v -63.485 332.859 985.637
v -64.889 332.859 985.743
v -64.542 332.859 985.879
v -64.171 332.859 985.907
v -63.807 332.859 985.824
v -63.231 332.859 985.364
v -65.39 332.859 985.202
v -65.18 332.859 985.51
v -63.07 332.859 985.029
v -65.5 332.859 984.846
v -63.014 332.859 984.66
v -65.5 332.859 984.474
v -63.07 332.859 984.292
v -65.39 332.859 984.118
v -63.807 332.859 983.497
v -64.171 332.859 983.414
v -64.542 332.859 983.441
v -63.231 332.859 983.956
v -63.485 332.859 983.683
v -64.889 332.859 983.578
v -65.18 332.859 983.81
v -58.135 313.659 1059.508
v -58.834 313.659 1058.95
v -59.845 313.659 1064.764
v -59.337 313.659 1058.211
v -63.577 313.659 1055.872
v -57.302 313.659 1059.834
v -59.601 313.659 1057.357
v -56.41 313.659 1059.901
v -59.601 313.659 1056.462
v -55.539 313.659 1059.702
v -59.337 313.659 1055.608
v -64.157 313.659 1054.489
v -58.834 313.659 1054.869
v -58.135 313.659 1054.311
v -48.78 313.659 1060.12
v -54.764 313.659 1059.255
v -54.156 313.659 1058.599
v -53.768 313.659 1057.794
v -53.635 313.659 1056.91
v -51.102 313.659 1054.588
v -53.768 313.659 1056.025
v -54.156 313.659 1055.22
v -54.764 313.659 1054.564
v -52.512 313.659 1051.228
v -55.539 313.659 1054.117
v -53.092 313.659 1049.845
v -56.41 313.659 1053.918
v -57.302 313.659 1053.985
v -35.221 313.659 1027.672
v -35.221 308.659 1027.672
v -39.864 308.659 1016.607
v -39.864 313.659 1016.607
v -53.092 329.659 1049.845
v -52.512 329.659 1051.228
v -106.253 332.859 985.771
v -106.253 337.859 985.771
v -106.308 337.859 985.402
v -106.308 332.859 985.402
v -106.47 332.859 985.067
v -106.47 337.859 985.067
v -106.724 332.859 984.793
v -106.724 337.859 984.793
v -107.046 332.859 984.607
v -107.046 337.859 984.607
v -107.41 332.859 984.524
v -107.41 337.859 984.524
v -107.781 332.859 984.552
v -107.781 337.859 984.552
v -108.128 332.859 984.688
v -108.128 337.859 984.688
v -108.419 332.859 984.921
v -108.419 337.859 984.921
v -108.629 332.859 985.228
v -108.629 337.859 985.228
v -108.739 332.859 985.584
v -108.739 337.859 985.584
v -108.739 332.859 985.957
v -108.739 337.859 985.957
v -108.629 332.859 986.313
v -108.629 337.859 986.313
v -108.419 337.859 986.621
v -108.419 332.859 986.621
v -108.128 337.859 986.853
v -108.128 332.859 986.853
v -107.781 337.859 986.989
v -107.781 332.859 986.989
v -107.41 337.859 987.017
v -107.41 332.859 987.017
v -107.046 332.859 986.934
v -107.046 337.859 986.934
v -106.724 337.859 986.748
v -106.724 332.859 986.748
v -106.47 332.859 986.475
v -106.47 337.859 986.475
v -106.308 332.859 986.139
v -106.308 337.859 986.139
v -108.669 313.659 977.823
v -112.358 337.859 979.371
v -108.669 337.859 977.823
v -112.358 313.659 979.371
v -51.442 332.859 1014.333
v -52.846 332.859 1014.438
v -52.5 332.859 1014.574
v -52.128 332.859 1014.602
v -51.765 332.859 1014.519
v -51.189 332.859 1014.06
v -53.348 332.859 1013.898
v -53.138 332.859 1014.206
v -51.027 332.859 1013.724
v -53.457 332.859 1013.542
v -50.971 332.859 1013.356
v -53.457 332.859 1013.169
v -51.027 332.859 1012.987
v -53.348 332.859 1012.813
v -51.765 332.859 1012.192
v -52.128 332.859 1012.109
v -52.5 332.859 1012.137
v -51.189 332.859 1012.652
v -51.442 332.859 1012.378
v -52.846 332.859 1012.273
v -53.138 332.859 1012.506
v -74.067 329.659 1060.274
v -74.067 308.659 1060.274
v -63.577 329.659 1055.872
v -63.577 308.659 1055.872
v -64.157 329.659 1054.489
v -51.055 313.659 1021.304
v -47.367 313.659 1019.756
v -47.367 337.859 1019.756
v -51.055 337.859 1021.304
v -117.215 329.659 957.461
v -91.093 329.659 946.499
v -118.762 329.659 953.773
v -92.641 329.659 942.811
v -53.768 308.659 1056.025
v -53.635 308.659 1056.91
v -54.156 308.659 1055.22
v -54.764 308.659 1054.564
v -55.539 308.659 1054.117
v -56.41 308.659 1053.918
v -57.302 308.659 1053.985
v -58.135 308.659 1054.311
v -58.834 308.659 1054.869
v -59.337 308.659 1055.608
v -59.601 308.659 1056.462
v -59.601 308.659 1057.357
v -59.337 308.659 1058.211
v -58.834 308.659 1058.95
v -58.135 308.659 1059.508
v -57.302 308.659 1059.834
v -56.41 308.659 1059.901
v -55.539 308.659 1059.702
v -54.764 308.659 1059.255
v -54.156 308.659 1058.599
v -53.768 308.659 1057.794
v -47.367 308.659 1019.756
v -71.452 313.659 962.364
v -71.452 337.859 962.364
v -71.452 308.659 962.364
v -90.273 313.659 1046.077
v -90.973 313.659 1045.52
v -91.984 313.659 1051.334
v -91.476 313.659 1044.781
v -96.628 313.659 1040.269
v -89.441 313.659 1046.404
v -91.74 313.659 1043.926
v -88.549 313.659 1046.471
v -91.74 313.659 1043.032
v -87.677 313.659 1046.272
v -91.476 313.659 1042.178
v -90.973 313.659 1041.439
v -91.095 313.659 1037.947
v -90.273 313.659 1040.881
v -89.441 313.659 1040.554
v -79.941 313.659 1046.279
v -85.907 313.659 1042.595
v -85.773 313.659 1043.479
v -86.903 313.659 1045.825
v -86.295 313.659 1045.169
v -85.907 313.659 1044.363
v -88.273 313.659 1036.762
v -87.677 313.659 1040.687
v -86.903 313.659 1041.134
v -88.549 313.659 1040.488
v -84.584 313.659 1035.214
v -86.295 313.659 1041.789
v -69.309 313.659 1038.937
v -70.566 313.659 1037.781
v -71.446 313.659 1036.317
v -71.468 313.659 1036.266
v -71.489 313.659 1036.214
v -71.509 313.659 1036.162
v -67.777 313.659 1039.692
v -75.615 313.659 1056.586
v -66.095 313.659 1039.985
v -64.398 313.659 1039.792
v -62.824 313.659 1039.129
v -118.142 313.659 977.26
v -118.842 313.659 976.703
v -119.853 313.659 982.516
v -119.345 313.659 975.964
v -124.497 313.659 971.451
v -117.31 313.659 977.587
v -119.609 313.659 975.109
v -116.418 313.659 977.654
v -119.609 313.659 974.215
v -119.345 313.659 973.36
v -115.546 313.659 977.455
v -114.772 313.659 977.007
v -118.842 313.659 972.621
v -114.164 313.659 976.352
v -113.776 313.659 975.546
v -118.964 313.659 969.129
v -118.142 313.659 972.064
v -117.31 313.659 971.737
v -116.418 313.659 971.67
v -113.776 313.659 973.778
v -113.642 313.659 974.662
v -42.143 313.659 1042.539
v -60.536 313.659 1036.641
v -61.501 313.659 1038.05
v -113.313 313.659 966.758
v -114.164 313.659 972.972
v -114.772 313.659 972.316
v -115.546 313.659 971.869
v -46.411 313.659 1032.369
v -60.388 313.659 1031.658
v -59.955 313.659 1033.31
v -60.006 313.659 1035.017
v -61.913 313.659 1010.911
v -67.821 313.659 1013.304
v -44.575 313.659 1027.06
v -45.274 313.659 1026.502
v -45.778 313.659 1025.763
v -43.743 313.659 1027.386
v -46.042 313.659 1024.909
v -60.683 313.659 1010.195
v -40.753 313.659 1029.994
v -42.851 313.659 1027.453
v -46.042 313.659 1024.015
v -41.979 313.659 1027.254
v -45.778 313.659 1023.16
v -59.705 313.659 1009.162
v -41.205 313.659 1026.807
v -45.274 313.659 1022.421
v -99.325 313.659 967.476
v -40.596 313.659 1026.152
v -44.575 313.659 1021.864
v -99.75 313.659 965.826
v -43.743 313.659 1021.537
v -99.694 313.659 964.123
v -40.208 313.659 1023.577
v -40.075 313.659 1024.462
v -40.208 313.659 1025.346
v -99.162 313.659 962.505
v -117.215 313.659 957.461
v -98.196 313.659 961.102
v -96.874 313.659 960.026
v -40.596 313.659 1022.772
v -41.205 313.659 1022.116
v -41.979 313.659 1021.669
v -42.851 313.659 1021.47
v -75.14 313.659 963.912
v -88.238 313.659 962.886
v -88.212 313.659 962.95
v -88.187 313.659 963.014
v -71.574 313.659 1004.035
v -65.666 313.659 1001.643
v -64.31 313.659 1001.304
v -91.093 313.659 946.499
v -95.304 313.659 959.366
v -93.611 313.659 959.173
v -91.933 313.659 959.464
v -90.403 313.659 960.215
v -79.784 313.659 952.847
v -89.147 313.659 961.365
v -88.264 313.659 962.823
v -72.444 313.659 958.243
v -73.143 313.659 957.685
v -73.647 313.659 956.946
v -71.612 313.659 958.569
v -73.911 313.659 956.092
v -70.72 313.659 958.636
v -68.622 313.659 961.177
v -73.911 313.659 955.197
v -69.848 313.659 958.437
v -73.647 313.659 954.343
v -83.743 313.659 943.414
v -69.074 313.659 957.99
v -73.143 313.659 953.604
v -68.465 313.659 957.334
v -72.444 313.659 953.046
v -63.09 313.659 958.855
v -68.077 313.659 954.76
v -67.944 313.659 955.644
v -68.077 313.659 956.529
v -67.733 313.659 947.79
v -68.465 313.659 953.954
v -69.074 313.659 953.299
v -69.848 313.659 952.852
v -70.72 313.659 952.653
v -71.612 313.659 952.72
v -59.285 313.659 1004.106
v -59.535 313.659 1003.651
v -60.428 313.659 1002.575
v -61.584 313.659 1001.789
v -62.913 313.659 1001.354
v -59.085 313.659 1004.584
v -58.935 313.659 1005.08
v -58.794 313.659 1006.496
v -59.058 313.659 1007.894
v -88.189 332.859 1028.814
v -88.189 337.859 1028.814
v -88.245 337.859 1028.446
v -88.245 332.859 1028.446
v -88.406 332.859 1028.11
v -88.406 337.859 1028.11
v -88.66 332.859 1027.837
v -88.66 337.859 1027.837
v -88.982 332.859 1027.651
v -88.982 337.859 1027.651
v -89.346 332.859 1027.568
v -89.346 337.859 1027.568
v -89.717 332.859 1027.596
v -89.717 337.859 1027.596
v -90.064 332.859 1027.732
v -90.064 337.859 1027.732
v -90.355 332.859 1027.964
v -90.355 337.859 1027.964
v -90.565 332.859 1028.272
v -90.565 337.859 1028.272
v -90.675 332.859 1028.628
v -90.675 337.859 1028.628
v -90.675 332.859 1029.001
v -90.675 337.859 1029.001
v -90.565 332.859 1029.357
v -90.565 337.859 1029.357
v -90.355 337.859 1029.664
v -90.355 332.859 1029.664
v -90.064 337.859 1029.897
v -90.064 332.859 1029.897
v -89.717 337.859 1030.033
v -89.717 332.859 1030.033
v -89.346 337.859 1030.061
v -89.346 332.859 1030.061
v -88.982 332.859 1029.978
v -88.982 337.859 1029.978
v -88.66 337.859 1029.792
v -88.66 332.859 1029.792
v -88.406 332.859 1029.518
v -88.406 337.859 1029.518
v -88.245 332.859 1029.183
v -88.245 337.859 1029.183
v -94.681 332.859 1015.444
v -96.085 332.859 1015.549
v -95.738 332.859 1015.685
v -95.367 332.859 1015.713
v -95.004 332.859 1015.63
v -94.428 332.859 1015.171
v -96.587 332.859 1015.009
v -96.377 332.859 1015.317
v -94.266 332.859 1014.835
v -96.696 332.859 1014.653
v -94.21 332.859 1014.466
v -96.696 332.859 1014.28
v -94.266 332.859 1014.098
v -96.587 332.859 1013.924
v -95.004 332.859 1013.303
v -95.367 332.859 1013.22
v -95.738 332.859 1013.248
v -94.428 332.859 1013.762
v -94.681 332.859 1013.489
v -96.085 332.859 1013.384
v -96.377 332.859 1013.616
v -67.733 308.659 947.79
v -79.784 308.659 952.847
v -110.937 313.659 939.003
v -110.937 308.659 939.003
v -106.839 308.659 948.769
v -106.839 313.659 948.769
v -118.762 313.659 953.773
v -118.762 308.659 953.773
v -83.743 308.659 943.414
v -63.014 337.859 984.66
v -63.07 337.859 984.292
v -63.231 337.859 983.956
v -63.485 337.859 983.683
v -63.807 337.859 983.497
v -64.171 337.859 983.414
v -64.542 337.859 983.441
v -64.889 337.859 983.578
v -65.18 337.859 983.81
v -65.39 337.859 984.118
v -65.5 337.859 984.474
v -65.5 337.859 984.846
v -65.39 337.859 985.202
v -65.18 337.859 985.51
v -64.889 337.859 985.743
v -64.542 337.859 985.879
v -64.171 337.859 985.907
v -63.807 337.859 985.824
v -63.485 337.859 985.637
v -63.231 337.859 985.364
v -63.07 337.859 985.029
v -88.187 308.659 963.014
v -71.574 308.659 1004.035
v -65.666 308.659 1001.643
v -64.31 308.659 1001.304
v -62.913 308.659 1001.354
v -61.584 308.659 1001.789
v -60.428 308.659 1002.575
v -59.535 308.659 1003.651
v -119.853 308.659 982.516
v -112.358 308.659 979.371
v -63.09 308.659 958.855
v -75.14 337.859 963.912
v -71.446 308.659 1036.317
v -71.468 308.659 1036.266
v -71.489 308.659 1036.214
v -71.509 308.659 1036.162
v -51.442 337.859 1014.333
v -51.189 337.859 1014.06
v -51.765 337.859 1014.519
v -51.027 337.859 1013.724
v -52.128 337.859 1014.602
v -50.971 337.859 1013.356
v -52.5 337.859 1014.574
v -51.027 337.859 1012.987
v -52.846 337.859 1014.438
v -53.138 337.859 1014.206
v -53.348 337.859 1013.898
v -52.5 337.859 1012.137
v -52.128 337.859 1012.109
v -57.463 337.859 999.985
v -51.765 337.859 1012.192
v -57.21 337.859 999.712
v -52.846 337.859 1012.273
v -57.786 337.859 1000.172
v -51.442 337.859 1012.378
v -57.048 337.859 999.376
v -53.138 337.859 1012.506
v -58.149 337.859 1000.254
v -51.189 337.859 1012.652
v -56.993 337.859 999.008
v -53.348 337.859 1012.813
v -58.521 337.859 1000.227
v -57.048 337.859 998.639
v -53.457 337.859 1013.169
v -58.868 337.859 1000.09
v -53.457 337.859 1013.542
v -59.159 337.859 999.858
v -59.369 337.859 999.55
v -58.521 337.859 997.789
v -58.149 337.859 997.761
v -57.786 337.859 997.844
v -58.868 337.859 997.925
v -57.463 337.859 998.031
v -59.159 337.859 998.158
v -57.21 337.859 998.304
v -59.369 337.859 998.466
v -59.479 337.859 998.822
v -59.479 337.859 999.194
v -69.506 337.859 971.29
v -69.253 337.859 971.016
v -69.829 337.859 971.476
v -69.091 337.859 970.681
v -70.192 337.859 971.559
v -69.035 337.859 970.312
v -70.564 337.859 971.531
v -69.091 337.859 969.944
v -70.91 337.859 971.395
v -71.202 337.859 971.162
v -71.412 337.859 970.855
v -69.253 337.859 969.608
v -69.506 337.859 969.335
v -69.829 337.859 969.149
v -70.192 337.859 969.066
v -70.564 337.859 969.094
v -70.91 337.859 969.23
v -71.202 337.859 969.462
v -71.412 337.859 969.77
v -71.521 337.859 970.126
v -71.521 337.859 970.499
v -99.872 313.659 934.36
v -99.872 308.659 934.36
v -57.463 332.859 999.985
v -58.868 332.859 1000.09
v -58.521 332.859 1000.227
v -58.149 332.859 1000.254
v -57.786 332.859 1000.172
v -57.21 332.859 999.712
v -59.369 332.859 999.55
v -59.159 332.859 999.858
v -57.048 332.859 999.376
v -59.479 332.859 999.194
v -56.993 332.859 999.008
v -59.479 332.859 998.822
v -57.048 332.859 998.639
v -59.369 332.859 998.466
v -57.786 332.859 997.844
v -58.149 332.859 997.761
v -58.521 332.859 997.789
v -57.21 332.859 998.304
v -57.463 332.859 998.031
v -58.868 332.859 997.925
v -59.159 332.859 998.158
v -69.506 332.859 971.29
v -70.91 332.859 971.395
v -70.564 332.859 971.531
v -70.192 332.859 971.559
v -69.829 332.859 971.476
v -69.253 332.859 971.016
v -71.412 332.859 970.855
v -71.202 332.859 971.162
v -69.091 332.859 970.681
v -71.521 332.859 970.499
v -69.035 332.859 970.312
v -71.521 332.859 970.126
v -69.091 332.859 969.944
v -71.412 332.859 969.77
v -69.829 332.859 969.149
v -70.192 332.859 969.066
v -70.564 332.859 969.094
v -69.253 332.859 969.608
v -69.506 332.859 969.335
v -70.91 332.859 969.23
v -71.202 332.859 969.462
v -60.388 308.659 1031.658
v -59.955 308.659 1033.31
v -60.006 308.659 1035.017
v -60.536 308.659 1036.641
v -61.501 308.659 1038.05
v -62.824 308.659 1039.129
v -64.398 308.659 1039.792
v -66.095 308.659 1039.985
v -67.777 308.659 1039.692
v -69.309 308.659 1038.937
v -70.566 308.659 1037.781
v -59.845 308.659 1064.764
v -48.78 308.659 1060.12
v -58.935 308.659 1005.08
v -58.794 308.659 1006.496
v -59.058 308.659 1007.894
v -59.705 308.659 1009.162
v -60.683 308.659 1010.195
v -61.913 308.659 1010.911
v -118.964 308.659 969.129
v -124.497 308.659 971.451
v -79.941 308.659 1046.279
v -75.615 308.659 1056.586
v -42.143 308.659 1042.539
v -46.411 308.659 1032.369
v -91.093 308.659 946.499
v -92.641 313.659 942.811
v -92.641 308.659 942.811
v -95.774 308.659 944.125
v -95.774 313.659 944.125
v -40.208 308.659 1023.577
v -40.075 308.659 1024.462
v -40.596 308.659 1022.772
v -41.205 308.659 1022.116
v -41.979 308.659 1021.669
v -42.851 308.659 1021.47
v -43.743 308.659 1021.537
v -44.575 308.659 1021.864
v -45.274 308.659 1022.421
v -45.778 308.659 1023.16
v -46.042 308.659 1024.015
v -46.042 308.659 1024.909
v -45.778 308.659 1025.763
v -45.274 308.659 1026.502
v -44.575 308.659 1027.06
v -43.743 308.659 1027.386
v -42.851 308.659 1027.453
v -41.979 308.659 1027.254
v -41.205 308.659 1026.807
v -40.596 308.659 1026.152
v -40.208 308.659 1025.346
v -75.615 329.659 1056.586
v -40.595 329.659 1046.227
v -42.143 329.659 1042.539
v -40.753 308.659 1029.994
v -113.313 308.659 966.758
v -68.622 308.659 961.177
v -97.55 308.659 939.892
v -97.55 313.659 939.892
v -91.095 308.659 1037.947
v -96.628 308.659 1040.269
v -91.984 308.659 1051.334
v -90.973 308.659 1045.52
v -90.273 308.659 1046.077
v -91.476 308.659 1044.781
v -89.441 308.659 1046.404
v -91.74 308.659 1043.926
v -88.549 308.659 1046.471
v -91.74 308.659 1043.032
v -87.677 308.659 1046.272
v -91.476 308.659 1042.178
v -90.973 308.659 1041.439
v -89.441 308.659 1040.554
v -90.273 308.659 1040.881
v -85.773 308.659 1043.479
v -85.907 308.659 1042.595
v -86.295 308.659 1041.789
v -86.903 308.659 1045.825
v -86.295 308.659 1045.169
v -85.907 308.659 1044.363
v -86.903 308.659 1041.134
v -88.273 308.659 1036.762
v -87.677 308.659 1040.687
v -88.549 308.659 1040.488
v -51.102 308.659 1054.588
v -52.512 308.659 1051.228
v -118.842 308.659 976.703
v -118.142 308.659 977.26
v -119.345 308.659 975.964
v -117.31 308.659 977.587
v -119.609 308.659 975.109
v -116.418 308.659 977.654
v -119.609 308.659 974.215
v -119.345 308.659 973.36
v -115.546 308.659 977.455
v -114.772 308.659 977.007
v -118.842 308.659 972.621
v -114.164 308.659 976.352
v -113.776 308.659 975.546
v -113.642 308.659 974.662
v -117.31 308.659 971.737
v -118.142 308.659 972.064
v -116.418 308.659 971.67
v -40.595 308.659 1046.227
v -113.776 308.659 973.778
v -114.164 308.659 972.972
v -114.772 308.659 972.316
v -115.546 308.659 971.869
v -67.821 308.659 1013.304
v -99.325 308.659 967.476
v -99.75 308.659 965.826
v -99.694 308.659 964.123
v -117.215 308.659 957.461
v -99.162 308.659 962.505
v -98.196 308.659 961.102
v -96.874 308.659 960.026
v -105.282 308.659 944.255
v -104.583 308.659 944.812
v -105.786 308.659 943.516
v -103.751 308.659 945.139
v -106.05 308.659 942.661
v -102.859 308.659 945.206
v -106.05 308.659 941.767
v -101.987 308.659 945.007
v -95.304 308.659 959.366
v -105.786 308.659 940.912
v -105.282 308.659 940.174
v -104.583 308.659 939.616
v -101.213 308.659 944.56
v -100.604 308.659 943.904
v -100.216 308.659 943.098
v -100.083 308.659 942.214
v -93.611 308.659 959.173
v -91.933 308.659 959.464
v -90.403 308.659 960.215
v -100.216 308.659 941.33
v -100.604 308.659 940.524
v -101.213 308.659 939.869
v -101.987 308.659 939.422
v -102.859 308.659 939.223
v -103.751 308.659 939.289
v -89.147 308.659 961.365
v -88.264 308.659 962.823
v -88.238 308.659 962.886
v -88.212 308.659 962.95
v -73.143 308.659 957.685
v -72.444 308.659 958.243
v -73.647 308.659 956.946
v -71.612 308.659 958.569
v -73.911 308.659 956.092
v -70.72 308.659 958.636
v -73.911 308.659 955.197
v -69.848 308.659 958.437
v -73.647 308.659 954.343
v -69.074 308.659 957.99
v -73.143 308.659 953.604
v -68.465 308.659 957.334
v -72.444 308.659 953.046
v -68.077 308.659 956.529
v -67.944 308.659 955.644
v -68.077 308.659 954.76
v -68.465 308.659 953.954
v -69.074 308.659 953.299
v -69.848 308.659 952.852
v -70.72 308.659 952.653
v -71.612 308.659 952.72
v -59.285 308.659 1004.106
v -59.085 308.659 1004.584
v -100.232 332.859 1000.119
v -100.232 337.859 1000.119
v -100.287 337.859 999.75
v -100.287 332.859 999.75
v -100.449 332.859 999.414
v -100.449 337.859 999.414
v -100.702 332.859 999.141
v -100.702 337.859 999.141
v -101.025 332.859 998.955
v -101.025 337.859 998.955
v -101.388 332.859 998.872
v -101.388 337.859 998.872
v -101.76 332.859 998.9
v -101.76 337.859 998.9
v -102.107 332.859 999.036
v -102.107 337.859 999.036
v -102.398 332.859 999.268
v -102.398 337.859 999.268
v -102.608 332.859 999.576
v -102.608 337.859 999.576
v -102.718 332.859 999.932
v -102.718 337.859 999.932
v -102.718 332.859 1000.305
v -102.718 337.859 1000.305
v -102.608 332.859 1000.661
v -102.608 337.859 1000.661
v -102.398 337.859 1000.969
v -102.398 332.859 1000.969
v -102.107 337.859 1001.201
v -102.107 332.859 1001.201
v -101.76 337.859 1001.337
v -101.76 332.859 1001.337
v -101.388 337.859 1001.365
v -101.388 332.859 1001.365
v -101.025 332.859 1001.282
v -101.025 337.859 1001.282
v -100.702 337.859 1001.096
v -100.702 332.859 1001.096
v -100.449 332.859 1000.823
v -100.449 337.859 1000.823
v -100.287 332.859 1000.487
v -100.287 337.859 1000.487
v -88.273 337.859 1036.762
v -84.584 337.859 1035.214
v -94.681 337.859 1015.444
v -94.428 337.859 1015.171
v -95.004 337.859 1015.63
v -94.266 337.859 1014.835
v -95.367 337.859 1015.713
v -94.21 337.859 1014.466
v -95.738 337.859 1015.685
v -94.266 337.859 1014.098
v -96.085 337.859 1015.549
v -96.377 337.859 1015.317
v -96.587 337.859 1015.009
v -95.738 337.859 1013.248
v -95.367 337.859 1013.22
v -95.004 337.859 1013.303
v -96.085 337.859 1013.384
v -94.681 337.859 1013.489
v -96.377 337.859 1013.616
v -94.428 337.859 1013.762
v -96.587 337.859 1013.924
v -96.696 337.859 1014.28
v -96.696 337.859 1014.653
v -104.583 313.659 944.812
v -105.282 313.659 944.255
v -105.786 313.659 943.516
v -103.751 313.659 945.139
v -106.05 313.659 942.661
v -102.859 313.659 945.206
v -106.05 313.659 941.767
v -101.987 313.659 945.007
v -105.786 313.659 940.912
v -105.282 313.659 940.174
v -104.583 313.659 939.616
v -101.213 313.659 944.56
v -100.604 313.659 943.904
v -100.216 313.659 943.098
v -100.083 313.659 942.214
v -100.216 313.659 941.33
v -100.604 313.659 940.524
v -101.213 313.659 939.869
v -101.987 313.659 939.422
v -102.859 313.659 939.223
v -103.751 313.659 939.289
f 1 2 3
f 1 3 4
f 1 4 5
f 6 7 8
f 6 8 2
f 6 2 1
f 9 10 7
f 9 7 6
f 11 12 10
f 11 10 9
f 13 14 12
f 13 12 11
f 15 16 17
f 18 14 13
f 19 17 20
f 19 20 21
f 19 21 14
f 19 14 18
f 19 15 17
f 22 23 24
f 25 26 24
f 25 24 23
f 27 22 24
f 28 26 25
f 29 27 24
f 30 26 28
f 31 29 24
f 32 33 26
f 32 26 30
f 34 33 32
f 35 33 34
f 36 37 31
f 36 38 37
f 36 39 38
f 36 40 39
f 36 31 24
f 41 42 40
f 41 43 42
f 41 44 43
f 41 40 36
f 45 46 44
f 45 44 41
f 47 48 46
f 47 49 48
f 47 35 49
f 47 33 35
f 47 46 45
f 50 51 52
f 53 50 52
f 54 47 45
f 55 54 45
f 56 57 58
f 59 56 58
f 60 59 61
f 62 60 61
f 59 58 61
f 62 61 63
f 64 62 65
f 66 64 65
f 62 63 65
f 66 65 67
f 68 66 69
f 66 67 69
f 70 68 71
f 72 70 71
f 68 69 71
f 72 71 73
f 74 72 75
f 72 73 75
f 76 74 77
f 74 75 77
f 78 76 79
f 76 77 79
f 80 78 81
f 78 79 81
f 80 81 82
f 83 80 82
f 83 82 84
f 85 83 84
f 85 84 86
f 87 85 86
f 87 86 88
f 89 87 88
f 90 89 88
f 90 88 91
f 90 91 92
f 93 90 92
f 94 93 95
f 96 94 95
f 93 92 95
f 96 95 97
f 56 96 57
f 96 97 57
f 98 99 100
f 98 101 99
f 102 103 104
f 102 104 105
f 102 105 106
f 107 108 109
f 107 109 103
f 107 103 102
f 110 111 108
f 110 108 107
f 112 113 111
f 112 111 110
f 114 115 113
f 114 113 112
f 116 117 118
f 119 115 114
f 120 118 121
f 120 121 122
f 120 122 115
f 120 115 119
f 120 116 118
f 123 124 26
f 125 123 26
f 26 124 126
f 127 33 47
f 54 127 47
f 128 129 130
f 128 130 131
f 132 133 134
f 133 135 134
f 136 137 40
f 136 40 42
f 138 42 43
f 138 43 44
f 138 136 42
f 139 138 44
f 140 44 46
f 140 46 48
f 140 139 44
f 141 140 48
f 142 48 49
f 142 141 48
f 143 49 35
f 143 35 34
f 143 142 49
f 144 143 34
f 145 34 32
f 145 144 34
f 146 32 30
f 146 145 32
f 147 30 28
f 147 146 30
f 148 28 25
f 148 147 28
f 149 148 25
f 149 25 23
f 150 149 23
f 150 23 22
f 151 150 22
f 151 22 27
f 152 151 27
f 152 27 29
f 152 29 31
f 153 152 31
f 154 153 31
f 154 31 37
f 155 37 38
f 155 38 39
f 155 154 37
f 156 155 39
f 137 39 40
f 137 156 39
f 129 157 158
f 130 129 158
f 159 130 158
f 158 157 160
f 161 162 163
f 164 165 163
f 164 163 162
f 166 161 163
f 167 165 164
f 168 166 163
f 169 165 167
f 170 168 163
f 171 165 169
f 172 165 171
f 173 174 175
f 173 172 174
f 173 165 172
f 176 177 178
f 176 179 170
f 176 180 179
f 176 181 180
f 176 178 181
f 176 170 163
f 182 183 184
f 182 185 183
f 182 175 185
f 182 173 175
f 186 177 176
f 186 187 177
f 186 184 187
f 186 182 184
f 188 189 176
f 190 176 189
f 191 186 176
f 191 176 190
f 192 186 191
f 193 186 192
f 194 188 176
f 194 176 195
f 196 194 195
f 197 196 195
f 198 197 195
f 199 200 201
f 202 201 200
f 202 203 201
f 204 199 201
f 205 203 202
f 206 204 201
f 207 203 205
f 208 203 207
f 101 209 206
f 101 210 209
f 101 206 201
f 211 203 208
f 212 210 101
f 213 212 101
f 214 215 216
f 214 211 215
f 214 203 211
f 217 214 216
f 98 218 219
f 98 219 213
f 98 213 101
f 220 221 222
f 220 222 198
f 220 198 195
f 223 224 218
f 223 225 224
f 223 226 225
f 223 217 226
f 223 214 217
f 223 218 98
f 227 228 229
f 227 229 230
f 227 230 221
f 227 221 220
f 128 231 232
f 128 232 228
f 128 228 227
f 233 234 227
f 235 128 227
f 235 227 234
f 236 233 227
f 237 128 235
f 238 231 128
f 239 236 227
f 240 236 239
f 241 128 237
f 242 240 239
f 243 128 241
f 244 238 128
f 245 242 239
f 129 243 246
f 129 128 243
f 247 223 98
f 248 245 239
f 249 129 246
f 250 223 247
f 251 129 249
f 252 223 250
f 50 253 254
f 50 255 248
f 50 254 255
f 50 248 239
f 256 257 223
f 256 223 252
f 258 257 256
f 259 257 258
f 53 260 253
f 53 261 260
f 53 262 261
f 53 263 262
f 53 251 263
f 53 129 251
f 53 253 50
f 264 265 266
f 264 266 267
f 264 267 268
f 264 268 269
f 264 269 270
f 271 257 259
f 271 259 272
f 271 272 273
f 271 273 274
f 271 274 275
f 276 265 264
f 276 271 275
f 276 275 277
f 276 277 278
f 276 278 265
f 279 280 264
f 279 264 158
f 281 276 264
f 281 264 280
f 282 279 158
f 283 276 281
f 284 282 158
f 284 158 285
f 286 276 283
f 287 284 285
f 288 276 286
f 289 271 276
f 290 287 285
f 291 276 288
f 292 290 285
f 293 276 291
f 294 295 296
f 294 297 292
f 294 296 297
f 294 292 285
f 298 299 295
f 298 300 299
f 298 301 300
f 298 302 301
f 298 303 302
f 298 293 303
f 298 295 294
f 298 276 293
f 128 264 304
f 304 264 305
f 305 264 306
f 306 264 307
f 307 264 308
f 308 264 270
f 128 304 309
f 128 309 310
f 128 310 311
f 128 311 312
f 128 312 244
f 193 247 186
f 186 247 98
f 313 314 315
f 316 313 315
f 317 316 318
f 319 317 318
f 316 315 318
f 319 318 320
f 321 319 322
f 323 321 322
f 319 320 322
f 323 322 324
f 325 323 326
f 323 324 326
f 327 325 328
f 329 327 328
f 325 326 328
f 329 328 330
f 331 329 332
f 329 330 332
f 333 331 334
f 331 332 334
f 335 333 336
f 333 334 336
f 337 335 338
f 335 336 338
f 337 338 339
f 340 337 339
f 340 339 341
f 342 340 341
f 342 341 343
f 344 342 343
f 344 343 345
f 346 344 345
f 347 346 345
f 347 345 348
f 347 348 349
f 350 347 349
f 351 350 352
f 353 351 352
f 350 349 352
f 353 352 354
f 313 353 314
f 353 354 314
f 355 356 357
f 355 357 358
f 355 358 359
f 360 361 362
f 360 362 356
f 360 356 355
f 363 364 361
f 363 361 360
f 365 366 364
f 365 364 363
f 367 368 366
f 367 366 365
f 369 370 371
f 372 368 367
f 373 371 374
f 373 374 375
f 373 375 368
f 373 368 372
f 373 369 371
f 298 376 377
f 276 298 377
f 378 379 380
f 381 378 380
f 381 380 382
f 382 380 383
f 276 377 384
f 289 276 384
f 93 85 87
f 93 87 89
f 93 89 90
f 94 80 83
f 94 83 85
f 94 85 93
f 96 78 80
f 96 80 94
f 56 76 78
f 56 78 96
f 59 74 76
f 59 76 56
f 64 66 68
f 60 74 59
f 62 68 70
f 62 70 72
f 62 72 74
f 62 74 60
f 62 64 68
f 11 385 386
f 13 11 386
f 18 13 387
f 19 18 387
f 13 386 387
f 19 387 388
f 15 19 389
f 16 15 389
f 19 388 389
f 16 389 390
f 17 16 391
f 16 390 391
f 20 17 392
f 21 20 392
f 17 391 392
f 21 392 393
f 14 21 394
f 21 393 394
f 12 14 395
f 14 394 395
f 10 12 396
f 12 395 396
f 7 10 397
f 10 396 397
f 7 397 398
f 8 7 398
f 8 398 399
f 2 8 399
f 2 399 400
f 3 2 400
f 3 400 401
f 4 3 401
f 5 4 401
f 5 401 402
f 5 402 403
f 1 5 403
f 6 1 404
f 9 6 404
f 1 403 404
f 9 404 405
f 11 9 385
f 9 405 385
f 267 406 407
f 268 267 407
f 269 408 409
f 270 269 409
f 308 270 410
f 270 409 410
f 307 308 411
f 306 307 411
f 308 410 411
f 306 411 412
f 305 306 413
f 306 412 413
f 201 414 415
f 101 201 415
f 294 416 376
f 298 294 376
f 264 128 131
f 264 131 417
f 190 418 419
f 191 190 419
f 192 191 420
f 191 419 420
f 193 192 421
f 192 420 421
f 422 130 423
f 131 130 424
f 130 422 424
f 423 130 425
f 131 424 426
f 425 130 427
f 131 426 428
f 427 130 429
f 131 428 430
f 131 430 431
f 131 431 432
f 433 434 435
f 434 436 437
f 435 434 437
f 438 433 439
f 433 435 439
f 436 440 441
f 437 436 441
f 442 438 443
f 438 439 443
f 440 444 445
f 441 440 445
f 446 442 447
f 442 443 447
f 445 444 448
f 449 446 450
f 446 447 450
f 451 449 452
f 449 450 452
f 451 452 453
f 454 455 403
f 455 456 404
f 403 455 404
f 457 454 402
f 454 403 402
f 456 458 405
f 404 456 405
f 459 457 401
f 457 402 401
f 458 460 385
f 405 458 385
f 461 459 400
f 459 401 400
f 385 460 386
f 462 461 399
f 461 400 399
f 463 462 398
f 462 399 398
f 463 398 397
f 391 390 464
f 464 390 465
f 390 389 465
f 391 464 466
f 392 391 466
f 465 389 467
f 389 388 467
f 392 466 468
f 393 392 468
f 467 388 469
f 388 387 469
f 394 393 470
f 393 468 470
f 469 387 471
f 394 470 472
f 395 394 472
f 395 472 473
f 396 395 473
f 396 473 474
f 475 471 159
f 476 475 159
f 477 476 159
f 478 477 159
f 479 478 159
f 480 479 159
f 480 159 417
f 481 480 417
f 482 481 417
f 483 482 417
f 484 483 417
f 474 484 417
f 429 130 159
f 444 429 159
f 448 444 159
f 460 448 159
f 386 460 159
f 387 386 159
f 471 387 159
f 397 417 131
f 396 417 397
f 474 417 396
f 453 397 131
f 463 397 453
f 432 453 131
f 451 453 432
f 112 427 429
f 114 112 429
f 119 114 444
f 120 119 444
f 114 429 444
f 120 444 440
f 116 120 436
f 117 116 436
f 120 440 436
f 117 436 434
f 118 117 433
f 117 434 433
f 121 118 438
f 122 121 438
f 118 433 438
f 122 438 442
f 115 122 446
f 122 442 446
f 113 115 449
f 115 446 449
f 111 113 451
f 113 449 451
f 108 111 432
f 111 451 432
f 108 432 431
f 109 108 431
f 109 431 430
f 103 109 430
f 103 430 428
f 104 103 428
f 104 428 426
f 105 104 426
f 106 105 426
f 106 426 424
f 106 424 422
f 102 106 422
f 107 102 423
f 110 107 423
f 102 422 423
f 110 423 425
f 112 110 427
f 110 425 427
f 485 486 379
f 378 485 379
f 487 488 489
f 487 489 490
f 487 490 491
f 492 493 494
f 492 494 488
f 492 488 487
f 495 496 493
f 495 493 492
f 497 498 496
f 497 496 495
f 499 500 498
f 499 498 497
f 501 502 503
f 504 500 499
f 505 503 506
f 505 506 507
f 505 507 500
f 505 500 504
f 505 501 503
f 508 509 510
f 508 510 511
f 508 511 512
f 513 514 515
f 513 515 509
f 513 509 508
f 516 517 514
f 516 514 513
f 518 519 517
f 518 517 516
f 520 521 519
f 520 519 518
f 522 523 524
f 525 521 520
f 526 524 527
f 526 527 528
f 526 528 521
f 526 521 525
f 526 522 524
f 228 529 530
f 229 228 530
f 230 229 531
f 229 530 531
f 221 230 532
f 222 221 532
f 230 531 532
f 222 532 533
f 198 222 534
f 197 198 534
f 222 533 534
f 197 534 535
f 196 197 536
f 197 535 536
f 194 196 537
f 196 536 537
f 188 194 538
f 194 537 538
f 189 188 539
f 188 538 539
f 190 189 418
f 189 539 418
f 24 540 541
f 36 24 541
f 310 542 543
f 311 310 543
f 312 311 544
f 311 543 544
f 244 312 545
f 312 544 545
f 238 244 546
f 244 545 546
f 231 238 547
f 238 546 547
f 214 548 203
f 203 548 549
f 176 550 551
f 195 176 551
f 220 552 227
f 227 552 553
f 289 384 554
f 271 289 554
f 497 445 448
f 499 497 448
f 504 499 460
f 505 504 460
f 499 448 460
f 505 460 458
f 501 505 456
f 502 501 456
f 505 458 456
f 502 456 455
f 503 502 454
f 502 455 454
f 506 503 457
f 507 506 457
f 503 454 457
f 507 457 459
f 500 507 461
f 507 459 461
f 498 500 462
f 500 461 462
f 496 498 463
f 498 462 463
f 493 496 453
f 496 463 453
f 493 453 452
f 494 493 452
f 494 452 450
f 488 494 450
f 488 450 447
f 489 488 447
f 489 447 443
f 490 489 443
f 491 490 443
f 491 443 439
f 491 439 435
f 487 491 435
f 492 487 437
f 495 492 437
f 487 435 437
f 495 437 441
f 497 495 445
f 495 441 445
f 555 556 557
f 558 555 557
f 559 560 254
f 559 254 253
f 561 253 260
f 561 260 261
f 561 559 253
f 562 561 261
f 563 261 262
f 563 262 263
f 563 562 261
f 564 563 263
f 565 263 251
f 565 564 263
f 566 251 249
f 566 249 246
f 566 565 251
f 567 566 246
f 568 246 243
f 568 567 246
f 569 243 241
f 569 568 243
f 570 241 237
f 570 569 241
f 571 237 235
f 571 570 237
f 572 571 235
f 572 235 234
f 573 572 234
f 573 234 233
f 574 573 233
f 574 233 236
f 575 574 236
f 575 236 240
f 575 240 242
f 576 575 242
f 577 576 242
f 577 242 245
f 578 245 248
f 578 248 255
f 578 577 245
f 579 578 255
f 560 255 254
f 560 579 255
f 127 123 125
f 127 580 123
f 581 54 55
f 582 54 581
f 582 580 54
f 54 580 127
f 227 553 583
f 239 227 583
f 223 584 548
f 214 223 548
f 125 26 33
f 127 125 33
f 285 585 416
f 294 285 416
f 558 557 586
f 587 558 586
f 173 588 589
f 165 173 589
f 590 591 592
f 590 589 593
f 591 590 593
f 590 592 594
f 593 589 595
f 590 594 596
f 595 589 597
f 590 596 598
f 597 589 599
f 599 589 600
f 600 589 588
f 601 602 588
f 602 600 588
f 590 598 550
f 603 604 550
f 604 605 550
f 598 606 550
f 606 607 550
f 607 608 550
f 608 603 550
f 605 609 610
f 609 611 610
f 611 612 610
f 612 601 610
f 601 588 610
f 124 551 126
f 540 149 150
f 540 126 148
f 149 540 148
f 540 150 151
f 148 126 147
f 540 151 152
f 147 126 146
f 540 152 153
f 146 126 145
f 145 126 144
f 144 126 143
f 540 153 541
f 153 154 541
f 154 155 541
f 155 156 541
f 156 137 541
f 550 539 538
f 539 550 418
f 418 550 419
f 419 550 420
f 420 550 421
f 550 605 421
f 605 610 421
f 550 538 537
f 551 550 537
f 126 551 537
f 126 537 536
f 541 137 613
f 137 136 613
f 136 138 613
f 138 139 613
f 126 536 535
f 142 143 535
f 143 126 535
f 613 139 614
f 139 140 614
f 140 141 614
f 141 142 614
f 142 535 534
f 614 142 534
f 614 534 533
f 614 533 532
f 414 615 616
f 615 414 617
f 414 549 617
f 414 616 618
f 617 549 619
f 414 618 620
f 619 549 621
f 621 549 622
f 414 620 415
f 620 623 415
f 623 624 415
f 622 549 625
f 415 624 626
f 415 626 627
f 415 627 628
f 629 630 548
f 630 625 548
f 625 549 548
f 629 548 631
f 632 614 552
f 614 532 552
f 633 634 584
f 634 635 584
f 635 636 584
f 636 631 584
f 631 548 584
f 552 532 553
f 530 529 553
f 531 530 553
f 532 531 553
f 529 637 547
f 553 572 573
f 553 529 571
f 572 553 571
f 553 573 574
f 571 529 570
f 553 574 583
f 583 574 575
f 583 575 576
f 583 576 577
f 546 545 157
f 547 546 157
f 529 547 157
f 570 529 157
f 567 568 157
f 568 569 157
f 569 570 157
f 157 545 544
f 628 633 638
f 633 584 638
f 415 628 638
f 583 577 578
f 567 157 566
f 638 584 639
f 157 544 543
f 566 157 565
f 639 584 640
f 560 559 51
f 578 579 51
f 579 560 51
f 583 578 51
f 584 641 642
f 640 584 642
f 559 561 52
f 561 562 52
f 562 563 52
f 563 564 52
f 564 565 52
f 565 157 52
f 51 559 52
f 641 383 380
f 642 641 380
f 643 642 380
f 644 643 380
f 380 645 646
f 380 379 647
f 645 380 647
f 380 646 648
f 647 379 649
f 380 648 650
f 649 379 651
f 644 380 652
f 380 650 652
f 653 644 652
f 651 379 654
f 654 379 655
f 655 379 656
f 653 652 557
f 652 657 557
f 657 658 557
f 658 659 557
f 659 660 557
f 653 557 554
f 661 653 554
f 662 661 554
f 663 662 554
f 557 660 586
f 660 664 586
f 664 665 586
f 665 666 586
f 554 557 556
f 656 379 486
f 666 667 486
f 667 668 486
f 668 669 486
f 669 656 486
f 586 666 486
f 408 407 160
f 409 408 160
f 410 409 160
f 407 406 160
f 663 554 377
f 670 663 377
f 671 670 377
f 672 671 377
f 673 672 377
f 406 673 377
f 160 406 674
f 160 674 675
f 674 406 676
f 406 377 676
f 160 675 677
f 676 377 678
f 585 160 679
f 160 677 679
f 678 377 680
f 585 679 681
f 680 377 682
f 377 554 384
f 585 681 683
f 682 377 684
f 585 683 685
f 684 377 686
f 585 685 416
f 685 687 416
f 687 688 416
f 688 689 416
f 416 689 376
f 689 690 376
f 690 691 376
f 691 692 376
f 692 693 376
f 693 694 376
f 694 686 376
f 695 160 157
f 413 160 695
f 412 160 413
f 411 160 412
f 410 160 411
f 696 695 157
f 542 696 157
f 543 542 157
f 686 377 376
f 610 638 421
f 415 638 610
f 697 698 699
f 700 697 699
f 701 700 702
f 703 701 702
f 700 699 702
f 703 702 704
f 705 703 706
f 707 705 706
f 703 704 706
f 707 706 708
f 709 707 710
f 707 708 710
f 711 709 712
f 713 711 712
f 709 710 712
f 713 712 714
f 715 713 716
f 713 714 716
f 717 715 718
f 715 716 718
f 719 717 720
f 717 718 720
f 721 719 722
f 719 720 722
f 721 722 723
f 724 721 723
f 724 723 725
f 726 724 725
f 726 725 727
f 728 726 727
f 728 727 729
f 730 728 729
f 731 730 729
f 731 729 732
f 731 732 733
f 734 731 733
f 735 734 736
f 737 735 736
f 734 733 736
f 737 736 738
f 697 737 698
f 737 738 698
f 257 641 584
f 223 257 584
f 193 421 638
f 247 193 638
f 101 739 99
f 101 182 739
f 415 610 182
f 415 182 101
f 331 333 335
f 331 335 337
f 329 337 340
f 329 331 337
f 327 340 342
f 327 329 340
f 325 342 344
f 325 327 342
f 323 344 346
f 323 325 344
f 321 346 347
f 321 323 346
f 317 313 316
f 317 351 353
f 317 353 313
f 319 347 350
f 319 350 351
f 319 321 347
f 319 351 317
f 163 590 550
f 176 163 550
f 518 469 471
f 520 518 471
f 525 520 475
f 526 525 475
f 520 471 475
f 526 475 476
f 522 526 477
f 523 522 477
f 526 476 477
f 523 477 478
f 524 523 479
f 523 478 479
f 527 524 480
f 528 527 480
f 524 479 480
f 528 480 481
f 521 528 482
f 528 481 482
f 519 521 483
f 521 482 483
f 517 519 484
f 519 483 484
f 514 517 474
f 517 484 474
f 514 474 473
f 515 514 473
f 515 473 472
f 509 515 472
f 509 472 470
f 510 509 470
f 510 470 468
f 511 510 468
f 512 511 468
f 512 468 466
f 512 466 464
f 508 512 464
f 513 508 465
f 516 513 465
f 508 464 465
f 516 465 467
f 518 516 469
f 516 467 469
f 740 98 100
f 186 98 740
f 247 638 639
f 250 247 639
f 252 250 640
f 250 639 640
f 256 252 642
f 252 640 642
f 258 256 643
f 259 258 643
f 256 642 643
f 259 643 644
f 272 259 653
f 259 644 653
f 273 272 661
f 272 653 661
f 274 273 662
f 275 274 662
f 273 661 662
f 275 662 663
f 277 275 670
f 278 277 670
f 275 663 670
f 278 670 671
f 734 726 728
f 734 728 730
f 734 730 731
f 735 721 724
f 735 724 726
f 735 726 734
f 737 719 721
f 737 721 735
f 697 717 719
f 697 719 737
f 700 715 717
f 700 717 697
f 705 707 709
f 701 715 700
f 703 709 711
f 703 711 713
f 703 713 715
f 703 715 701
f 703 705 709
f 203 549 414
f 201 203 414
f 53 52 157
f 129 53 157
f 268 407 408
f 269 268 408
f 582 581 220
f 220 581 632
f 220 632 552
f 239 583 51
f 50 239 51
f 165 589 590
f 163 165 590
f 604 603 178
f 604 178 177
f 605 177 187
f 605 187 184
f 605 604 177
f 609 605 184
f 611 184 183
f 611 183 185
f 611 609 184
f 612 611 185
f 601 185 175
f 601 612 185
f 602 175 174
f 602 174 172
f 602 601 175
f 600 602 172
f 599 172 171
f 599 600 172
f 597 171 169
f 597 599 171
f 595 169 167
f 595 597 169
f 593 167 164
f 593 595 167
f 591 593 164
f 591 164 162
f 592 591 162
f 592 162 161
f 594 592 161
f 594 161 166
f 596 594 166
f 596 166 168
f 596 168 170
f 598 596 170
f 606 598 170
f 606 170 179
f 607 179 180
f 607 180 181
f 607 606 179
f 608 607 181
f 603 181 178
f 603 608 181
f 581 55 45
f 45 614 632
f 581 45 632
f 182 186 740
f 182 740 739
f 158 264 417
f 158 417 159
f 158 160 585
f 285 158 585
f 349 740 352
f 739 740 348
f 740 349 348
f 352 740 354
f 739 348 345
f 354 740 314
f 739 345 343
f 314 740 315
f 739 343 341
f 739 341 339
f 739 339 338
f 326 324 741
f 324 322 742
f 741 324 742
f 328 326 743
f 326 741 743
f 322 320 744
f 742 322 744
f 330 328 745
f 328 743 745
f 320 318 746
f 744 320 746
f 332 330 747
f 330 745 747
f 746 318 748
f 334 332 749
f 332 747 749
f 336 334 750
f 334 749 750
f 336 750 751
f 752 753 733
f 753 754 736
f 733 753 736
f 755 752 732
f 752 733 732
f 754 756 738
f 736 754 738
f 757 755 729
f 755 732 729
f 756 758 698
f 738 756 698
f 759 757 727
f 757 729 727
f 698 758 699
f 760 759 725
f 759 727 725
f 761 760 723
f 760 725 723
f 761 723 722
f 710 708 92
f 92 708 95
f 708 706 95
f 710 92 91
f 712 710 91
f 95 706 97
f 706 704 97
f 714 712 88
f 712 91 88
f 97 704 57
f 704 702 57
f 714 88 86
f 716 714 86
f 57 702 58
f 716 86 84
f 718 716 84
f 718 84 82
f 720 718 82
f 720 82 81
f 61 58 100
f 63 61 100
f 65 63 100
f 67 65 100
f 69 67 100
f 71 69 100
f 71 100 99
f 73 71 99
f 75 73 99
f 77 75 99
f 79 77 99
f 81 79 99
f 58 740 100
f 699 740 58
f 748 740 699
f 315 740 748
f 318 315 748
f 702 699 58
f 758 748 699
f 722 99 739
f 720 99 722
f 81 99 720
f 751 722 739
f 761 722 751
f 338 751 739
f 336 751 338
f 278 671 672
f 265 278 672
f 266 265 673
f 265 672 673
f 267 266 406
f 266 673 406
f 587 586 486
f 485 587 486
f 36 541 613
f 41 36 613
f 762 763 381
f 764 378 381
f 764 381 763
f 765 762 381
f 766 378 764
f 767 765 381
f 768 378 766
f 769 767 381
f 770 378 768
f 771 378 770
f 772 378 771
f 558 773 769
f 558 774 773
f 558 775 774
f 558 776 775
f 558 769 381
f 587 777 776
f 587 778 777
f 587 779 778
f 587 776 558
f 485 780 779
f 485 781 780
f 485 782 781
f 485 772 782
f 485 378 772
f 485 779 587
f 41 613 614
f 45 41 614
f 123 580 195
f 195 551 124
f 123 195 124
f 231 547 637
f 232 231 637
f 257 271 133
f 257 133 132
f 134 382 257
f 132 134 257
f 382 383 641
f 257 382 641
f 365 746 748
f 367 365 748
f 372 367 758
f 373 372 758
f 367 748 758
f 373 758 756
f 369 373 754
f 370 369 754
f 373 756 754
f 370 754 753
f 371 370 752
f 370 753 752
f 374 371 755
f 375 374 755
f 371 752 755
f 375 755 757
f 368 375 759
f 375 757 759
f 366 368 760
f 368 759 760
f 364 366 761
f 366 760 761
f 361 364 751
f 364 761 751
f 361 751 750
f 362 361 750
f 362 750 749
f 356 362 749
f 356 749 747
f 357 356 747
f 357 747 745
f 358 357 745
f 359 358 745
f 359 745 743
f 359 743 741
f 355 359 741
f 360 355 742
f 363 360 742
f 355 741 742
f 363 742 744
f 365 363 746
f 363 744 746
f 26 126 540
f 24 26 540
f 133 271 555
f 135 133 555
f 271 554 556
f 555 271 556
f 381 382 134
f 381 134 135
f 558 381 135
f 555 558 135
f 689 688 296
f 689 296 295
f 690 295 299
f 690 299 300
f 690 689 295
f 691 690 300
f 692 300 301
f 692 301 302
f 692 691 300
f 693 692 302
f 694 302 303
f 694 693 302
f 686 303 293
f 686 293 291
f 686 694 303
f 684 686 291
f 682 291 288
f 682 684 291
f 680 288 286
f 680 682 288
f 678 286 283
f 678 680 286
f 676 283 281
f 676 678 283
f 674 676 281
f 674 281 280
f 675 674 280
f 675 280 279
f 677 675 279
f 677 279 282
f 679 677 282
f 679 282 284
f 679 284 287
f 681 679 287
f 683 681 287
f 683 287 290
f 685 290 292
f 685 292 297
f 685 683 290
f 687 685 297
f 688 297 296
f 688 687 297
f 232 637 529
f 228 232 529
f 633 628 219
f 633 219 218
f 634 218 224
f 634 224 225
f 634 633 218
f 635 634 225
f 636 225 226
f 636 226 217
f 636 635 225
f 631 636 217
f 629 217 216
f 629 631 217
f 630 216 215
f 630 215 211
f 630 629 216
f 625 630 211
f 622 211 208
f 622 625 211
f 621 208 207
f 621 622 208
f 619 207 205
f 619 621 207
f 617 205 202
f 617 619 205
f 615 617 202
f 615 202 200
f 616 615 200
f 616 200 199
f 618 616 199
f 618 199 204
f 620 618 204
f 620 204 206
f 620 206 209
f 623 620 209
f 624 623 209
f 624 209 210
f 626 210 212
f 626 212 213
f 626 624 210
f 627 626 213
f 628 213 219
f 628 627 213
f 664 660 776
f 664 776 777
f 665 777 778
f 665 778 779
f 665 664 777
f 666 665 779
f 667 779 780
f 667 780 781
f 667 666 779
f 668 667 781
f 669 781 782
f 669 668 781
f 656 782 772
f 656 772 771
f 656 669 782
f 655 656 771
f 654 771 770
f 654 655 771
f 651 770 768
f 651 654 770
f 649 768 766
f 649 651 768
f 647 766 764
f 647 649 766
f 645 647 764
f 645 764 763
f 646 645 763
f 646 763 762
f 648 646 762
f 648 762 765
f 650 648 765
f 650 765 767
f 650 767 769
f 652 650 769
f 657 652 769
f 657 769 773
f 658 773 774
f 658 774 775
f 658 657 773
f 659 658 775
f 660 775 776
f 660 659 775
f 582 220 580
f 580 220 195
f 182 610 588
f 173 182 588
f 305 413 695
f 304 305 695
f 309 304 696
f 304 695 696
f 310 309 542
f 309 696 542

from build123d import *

# Parameters (mm, degrees)
CROQUIS1_R              = 3
SALIENTE_EXTRUIR1_DEPTH = 5
SALIENTE_EXTRUIR2_DEPTH = 16
SALIENTE_EXTRUIR3_DEPTH = 8.2
CROQUIS3_R              = 1.25
CORTAR_EXTRUIR1_DEPTH   = 5


with BuildPart() as part:
    # Croquis1 → Saliente-Extruir1 (new body)
    with BuildSketch(Plane(origin=(0, 308.658769599, 0), x_dir=(1, 0, 0), z_dir=(0, 1, 0))):
        Polygon((-79.783844322, -952.847201319), (-83.742628833, -943.41403856), (-91.093413893, -946.498918444), (-92.641298847, -942.810551303), (-95.774048426, -944.125262056), (-97.550477858, -939.892309261), (-99.87230529, -934.359758549), (-110.937406713, -939.003413413), (-106.839149849, -948.76891692), (-118.762445593, -953.772727382), (-117.214560638, -957.461094523), (-113.313042635, -966.757800174), (-118.964295032, -969.129442753), (-124.496845743, -971.451270185), (-119.85319088, -982.516371608), (-112.357754912, -979.370786552), (-88.272530549, -1036.762099686), (-91.095204728, -1037.946682112), (-96.62775544, -1040.268509543), (-91.984100576, -1051.333610967), (-79.940508545, -1046.279316155), (-75.615152484, -1056.58596144), (-74.067267529, -1060.274328581), (-63.576953324, -1055.871892786), (-59.845268011, -1064.763913767), (-48.780166587, -1060.120258903), (-51.101994019, -1054.587708191), (-52.511851901, -1051.228237922), (-40.595335724, -1046.227272618), (-42.143220678, -1042.538905477), (-46.411310232, -1032.3687173), (-40.753278269, -1029.994229562), (-35.220727557, -1027.67240213), (-39.864382421, -1016.607300707), (-47.366597955, -1019.755730922), (-71.451822317, -962.364417787), (-68.622368572, -961.176990204), (-63.089817861, -958.855162772), (-67.733472724, -947.790061349), align=None)
        with Locations((-88.773377296, -1043.479232823)):
            Circle(CROQUIS1_R, mode=Mode.SUBTRACT)
        with Locations((-56.634544731, -1056.909535623)):
            Circle(CROQUIS1_R, mode=Mode.SUBTRACT)
        with BuildLine():
            Line((-71.509217483, -1036.162059123), (-99.325497684, -967.476035253))
            ThreePointArc((-99.325497684, -967.476035253), (-96.112790855, -959.639858493), (-88.264495604, -962.822846557))
            ThreePointArc((-88.264495604, -962.822846557), (-88.224915609, -962.918213511), (-88.186982587, -963.014247451))
            Line((-88.186982587, -963.014247451), (-71.574392562, -1004.035287893))
            Line((-71.574392562, -1004.035287893), (-65.666191812, -1001.64260073))
            ThreePointArc((-65.666191812, -1001.64260073), (-62.233253946, -1001.525303468), (-59.534729647, -1003.650577014))
            ThreePointArc((-59.534729647, -1003.650577014), (-59.178911441, -1004.342131364), (-58.934639419, -1005.080497936))
            ThreePointArc((-58.934639419, -1005.080497936), (-59.336480357, -1008.551140269), (-61.912548923, -1010.911374385))
            Line((-61.912548923, -1010.911374385), (-67.820749673, -1013.304061547))
            Line((-67.820749673, -1013.304061547), (-60.387770455, -1031.658125581))
            ThreePointArc((-60.387770455, -1031.658125581), (-63.587576477, -1039.516957646), (-71.446408542, -1036.317151624))
            ThreePointArc((-71.446408542, -1036.317151624), (-71.478353691, -1036.239824336), (-71.509217483, -1036.162059123))
        make_face(mode=Mode.SUBTRACT)
        with Locations((-43.075105701, -1024.461678851)):
            Circle(CROQUIS1_R, mode=Mode.SUBTRACT)
        with Locations((-116.6424676, -974.661993465)):
            Circle(CROQUIS1_R, mode=Mode.SUBTRACT)
        with Locations((-103.08302857, -942.214136692)):
            Circle(CROQUIS1_R, mode=Mode.SUBTRACT)
        with Locations((-70.944196004, -955.644439492)):
            Circle(CROQUIS1_R, mode=Mode.SUBTRACT)
    extrude(amount=SALIENTE_EXTRUIR1_DEPTH)

    # Croquis2 → Saliente-Extruir2 (add)
    with BuildSketch(Plane(origin=(0, 313.658769599, 0), x_dir=(1, 0, 0), z_dir=(0, 1, 0))):
        Polygon((-112.357754912, -979.370786552), (-88.272530549, -1036.762099686), (-84.584163408, -1035.214214732), (-108.669387771, -977.822901597), align=None)
        Polygon((-71.451822317, -962.364417787), (-47.366597955, -1019.755730922), (-51.054965096, -1021.303615877), (-75.140189458, -963.912302742), align=None)
        Polygon((-91.093413893, -946.498918444), (-117.214560638, -957.461094523), (-118.762445593, -953.772727382), (-92.641298847, -942.810551303), align=None)
        Polygon((-74.067267529, -1060.274328581), (-63.576953324, -1055.871892786), (-64.157410182, -1054.488755108), (-53.092308759, -1049.845100244), (-52.511851901, -1051.228237922), (-40.595335724, -1046.227272618), (-42.143220678, -1042.538905477), (-75.615152484, -1056.58596144), align=None)
    extrude(amount=SALIENTE_EXTRUIR2_DEPTH)

    # Croquis4 → Saliente-Extruir3 (add)
    with BuildSketch(Plane(origin=(0, 329.658769599, 0), x_dir=(1, 0, 0), z_dir=(0, 1, 0))):
        Polygon((-112.357754912, -979.370786552), (-108.669387771, -977.822901597), (-84.584163408, -1035.214214732), (-88.272530549, -1036.762099686), align=None)
        Polygon((-75.140189458, -963.912302742), (-71.451822317, -962.364417787), (-47.366597955, -1019.755730922), (-51.054965096, -1021.303615877), align=None)
    extrude(amount=SALIENTE_EXTRUIR3_DEPTH)

    # Croquis3 → Cortar-Extruir1 (cut)
    with BuildSketch(Plane(origin=(0, 337.858769599, 0), x_dir=(1, 0, 0), z_dir=(0, 1, 0))):
        with Locations((-101.481612206, -1000.1185865)):
            Circle(CROQUIS3_R)
        with Locations((-107.502918296, -985.770758216)):
            Circle(CROQUIS3_R)
        with Locations((-95.460306115, -1014.466414784)):
            Circle(CROQUIS3_R)
        with Locations((-89.439000024, -1028.814243067)):
            Circle(CROQUIS3_R)
        with Locations((-70.285352842, -970.312274407)):
            Circle(CROQUIS3_R)
        with Locations((-64.264046752, -984.66010269)):
            Circle(CROQUIS3_R)
        with Locations((-52.22143457, -1013.355759258)):
            Circle(CROQUIS3_R)
        with Locations((-58.242740661, -999.007930974)):
            Circle(CROQUIS3_R)
    extrude(amount=-CORTAR_EXTRUIR1_DEPTH, mode=Mode.SUBTRACT)


solid = part.part
